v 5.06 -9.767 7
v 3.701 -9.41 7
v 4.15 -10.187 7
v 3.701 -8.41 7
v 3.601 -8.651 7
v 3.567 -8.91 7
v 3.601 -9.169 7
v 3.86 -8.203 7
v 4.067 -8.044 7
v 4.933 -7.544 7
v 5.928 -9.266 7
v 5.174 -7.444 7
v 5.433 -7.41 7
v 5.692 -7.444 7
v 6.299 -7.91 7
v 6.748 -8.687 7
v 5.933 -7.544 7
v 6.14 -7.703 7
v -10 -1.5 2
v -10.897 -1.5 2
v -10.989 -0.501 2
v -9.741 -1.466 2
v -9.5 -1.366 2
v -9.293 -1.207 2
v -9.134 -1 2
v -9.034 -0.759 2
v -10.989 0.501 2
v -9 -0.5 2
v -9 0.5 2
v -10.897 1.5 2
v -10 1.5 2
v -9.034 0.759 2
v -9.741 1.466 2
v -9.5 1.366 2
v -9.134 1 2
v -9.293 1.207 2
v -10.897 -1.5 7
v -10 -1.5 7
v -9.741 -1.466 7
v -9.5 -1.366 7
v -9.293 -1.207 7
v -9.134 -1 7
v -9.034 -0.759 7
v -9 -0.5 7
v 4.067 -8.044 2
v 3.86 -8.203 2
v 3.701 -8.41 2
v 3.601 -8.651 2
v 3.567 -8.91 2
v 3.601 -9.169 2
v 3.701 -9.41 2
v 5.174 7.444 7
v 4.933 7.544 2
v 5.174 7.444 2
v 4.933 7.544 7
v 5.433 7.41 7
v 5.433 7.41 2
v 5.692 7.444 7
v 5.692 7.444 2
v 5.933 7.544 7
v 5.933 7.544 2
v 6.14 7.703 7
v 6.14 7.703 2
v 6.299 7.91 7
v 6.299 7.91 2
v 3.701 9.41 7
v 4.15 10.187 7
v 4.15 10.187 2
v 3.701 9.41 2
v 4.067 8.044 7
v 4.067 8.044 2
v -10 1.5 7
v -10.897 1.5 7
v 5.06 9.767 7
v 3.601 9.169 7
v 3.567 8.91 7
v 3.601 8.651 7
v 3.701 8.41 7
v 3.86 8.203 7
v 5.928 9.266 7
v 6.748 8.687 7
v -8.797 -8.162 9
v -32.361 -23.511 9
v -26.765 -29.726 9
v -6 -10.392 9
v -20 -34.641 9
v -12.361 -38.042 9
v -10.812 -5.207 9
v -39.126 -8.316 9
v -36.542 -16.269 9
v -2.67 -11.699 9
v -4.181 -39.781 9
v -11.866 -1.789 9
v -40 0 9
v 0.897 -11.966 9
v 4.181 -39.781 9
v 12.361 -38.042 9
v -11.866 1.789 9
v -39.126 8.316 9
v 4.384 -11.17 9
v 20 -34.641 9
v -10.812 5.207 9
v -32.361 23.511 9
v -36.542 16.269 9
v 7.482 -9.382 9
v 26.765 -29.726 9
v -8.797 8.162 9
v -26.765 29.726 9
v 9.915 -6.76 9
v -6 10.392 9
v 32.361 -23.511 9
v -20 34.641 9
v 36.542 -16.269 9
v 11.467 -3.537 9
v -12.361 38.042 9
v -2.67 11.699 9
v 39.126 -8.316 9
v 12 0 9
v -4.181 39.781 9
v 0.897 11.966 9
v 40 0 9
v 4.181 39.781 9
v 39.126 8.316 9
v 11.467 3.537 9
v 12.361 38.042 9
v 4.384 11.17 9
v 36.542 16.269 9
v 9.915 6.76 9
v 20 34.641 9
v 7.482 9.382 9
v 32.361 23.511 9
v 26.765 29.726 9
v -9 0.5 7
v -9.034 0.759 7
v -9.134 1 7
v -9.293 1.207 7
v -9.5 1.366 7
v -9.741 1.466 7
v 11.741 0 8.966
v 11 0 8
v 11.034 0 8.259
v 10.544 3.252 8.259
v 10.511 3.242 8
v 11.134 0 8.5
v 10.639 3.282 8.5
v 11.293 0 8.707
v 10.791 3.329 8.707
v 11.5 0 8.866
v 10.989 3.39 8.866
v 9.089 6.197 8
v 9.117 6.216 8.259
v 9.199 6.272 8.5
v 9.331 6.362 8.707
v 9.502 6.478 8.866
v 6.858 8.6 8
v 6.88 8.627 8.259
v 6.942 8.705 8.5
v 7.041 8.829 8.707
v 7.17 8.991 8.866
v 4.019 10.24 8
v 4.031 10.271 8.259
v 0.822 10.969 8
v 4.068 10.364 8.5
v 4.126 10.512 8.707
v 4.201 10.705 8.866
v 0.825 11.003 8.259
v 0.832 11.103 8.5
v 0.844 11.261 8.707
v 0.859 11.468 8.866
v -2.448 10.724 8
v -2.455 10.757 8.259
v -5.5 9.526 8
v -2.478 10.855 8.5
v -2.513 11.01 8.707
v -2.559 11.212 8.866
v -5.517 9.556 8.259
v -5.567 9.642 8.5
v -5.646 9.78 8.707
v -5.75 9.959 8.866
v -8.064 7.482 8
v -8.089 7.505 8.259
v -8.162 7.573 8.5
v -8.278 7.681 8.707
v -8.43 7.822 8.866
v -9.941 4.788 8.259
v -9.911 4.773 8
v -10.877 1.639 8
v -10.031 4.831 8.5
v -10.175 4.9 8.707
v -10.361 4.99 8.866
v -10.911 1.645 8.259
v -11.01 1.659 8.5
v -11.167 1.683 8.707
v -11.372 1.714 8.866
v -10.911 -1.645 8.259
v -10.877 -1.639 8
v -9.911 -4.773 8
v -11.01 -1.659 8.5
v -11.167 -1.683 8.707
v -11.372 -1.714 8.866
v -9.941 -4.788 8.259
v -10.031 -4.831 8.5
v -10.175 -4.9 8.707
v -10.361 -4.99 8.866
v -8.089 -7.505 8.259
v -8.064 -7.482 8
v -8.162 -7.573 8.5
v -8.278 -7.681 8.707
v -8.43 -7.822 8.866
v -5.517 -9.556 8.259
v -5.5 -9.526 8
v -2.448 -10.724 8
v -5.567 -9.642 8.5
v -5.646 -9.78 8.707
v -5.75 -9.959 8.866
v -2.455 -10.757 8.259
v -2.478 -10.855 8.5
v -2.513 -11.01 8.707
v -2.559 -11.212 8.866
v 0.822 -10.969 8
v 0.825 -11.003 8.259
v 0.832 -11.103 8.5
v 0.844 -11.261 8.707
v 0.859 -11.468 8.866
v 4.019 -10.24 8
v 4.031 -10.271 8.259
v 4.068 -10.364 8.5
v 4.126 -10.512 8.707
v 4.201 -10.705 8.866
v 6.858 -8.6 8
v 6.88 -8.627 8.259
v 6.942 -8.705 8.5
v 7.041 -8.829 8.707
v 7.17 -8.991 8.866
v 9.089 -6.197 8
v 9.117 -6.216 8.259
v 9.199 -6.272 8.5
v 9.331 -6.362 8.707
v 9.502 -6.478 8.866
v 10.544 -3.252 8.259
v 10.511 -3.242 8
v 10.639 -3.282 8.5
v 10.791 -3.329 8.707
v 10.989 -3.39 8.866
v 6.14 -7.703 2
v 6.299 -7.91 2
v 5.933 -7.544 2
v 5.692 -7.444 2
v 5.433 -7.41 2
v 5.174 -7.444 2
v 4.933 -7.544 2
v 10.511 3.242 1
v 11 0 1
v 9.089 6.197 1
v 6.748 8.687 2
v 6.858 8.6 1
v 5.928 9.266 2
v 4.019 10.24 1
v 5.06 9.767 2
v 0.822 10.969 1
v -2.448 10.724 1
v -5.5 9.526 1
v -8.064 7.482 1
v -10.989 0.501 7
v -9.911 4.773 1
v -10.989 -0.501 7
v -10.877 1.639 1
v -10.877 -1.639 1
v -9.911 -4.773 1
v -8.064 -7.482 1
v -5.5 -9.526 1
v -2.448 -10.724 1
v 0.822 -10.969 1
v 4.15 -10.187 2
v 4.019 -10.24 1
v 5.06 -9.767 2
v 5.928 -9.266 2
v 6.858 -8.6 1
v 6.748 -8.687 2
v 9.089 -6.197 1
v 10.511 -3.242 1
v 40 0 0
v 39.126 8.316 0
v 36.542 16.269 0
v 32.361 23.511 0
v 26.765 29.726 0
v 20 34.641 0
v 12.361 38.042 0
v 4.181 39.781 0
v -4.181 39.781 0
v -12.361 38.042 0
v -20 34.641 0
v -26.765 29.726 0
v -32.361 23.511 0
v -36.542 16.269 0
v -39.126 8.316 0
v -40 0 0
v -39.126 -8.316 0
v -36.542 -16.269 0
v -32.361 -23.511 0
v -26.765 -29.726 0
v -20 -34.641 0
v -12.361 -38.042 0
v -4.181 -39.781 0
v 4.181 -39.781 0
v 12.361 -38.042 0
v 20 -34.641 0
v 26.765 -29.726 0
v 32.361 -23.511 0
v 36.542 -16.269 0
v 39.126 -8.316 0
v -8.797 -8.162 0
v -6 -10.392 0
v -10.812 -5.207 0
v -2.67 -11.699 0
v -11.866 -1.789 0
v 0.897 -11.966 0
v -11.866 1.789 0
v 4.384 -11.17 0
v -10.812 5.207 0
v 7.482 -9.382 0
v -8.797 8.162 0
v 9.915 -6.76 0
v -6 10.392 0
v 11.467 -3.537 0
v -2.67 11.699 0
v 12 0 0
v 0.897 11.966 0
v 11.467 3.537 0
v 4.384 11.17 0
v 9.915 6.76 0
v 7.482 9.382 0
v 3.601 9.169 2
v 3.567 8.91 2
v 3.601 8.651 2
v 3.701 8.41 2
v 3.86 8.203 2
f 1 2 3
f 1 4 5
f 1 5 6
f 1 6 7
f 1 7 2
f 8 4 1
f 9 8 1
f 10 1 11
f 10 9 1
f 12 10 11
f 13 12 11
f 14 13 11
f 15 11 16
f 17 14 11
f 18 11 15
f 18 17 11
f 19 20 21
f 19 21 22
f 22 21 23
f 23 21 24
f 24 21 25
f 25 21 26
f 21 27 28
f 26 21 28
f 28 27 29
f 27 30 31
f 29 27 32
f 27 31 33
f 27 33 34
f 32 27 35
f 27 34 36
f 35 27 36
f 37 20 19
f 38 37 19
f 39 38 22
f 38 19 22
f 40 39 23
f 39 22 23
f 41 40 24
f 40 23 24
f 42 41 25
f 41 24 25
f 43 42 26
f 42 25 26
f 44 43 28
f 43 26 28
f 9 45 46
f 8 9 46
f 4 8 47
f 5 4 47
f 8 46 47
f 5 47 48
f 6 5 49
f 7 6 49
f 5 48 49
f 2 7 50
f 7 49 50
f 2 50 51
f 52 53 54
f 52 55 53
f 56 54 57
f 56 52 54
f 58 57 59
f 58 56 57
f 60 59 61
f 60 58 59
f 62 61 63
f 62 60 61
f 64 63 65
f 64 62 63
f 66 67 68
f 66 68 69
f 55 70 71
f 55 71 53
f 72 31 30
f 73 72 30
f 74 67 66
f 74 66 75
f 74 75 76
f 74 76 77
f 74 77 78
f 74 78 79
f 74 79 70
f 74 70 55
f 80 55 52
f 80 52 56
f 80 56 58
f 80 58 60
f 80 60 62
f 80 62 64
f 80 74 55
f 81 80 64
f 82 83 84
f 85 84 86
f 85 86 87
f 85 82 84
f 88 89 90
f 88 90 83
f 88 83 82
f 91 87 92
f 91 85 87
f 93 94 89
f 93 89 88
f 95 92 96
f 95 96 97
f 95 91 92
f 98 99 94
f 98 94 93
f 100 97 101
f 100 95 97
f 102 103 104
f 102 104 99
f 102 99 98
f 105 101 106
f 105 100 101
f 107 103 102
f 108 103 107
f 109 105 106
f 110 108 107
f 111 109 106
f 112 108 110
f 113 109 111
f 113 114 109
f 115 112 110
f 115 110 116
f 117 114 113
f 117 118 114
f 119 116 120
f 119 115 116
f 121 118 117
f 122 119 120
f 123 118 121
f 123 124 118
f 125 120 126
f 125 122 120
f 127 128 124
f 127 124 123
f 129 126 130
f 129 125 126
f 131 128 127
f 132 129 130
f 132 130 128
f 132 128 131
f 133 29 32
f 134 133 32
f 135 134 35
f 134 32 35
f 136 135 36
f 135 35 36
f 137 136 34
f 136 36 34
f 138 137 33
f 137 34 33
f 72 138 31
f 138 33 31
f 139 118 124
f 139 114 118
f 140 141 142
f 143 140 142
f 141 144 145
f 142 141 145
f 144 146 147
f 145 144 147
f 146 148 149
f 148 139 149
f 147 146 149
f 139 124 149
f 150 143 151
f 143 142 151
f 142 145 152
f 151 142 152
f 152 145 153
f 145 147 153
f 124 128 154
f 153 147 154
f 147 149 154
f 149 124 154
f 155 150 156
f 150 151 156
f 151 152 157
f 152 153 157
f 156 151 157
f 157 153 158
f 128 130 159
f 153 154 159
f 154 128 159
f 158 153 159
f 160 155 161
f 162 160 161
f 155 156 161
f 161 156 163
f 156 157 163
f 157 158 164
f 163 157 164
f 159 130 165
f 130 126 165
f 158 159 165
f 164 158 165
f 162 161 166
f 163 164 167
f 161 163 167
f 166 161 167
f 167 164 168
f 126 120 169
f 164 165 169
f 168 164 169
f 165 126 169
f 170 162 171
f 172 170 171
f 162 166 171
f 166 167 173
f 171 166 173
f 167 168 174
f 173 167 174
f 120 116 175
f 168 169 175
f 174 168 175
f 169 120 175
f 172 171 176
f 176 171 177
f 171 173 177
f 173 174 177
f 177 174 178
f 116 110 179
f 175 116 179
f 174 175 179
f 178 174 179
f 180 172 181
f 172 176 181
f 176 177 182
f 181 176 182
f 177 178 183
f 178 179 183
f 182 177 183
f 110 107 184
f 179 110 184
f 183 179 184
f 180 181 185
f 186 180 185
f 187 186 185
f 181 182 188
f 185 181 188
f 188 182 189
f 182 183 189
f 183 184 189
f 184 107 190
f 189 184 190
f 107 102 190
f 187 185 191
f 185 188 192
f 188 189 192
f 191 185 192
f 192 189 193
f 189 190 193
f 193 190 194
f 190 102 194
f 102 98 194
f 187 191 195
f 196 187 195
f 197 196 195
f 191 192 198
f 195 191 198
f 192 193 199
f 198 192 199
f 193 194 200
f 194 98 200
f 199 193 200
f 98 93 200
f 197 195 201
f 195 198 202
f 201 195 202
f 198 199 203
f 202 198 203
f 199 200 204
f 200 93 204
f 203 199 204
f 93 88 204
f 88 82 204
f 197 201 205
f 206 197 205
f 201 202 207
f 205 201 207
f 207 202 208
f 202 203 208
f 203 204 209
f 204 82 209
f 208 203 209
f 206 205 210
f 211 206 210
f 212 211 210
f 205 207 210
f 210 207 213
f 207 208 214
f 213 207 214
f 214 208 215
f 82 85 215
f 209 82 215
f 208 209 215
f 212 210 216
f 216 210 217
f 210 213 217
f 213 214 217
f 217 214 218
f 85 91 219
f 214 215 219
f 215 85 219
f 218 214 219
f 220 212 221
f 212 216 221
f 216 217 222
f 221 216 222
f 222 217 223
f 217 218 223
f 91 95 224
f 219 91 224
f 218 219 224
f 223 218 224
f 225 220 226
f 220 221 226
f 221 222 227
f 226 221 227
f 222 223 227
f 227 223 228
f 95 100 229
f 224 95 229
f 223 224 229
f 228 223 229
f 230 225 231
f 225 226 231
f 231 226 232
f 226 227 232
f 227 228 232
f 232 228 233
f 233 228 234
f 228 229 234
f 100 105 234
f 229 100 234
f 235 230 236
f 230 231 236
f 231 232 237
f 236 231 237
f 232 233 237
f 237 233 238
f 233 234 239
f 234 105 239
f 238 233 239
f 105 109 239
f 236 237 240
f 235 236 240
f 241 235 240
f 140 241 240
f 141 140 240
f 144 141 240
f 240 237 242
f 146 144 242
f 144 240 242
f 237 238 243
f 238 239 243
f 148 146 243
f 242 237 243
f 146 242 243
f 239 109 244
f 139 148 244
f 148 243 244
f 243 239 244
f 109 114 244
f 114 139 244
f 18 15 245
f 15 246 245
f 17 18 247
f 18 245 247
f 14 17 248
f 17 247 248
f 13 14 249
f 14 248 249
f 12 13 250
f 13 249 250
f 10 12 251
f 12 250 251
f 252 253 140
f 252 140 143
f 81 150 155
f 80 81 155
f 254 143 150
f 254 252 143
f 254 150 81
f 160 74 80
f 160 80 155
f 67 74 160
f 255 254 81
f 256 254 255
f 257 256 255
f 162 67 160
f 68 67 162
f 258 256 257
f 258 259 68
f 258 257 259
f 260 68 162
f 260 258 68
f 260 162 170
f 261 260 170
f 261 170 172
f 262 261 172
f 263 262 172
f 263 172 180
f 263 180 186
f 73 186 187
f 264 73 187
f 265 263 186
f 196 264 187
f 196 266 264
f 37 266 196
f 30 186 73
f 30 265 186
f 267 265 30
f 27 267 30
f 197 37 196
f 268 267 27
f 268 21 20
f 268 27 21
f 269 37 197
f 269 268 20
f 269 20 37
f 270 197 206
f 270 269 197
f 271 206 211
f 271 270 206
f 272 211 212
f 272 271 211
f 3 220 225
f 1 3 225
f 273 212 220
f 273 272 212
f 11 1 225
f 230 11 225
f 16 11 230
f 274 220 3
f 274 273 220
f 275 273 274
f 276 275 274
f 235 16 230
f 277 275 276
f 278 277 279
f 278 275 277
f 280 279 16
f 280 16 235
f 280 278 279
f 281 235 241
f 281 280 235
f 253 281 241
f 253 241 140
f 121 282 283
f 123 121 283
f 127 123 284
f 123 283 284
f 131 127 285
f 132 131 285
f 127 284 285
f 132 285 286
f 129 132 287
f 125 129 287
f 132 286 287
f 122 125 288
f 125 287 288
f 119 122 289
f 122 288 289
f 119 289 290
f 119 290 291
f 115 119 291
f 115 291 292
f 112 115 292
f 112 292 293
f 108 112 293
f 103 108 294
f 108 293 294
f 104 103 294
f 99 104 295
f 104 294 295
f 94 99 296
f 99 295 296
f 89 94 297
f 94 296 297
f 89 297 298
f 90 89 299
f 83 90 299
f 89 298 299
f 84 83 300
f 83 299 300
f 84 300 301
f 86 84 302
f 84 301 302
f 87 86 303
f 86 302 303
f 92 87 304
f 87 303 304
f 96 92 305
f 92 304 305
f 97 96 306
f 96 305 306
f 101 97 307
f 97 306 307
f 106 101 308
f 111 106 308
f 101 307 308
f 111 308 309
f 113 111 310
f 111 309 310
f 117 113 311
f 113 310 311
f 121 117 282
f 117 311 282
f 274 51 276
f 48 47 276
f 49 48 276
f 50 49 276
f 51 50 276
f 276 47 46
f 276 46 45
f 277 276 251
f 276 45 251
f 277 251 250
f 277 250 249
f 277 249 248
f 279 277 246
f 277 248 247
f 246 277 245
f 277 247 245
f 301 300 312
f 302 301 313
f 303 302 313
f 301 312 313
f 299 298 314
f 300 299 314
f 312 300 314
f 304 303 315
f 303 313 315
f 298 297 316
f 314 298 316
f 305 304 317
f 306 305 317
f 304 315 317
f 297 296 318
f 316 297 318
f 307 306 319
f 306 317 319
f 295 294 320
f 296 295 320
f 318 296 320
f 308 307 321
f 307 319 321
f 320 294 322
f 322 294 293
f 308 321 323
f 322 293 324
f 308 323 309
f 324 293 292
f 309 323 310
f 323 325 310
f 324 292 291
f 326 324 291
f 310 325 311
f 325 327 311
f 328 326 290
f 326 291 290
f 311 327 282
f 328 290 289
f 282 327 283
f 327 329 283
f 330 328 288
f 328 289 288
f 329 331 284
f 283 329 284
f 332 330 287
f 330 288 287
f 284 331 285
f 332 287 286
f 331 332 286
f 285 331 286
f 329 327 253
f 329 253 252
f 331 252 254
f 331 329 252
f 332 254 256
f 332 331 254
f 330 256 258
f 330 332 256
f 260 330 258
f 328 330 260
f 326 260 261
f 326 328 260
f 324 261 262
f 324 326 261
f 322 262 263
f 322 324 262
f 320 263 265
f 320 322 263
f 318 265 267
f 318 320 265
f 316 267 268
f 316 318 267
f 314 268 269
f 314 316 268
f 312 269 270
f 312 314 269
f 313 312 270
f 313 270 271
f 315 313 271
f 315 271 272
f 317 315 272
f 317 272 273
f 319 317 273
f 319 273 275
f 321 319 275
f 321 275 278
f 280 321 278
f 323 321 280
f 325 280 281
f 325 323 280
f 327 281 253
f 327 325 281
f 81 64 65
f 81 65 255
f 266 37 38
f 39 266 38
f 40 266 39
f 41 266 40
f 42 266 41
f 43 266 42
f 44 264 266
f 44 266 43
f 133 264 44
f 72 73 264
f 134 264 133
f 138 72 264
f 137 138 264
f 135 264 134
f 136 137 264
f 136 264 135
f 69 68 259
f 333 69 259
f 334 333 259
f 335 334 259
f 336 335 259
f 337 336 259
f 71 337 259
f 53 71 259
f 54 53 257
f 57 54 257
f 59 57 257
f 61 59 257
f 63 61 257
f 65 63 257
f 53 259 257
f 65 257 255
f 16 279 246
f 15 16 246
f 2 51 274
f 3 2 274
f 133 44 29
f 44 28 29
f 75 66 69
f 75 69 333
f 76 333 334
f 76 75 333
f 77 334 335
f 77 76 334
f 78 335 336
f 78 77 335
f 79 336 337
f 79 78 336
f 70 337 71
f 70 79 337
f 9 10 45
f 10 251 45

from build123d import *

# Parameters (mm, degrees)
F0_R     = 40
F0_R_2   = 11
F1_DEPTH = 9
F2_R     = 1
F3_SIZE  = 1
F9_DEPTH = 2.5


with BuildPart() as f1:
    # F0 (on Top) → F1 (new body)
    with BuildSketch(Plane.XY):
        Circle(F0_R)
        Circle(F0_R_2, mode=Mode.SUBTRACT)
    extrude(amount=F1_DEPTH)

    # F2
    f2_edges = [f1.edges().sort_by_distance(p)[0] for p in [
        (-11, 0, 9),
    ]]
    fillet(f2_edges, radius=F2_R)

    # F3
    f3_edges = [f1.edges().sort_by_distance(p)[0] for p in [
        (-11, 0, 0),
    ]]
    chamfer(f3_edges, length=F3_SIZE)

    # F8 (on face) → F9 (join, symmetric)
    with BuildSketch(Plane.XY.offset(4.5)):
        with BuildLine():
            Line((-12, 1.5), (-12, -1.5))
            Line((-12, -1.5), (-10, -1.5))
            ThreePointArc((-10, -1.5), (-9.292893, -1.207107), (-9, -0.5))
            Line((-9, -0.5), (-9, 0.5))
            ThreePointArc((-9, 0.5), (-9.292893, 1.207107), (-10, 1.5))
            Line((-10, 1.5), (-12, 1.5))
        make_face()
        with BuildLine():
            Line((4.700962, -11.142305), (7.299038, -9.642305))
            Line((7.299038, -9.642305), (6.299038, -7.910254))
            ThreePointArc((6.299038, -7.910254), (5.691832, -7.444328), (4.933013, -7.544229))
            Line((4.933013, -7.544229), (4.066987, -8.044229))
            ThreePointArc((4.066987, -8.044229), (3.601061, -8.651435), (3.700962, -9.410254))
            Line((3.700962, -9.410254), (4.700962, -11.142305))
        make_face()
        with BuildLine():
            Line((7.299038, 9.642305), (4.700962, 11.142305))
            Line((4.700962, 11.142305), (3.700962, 9.410254))
            ThreePointArc((3.700962, 9.410254), (3.601061, 8.651435), (4.066987, 8.044229))
            Line((4.066987, 8.044229), (4.933013, 7.544229))
            ThreePointArc((4.933013, 7.544229), (5.691832, 7.444328), (6.299038, 7.910254))
            Line((6.299038, 7.910254), (7.299038, 9.642305))
        make_face()
    extrude(amount=F9_DEPTH, both=True)


solid = f1.part
